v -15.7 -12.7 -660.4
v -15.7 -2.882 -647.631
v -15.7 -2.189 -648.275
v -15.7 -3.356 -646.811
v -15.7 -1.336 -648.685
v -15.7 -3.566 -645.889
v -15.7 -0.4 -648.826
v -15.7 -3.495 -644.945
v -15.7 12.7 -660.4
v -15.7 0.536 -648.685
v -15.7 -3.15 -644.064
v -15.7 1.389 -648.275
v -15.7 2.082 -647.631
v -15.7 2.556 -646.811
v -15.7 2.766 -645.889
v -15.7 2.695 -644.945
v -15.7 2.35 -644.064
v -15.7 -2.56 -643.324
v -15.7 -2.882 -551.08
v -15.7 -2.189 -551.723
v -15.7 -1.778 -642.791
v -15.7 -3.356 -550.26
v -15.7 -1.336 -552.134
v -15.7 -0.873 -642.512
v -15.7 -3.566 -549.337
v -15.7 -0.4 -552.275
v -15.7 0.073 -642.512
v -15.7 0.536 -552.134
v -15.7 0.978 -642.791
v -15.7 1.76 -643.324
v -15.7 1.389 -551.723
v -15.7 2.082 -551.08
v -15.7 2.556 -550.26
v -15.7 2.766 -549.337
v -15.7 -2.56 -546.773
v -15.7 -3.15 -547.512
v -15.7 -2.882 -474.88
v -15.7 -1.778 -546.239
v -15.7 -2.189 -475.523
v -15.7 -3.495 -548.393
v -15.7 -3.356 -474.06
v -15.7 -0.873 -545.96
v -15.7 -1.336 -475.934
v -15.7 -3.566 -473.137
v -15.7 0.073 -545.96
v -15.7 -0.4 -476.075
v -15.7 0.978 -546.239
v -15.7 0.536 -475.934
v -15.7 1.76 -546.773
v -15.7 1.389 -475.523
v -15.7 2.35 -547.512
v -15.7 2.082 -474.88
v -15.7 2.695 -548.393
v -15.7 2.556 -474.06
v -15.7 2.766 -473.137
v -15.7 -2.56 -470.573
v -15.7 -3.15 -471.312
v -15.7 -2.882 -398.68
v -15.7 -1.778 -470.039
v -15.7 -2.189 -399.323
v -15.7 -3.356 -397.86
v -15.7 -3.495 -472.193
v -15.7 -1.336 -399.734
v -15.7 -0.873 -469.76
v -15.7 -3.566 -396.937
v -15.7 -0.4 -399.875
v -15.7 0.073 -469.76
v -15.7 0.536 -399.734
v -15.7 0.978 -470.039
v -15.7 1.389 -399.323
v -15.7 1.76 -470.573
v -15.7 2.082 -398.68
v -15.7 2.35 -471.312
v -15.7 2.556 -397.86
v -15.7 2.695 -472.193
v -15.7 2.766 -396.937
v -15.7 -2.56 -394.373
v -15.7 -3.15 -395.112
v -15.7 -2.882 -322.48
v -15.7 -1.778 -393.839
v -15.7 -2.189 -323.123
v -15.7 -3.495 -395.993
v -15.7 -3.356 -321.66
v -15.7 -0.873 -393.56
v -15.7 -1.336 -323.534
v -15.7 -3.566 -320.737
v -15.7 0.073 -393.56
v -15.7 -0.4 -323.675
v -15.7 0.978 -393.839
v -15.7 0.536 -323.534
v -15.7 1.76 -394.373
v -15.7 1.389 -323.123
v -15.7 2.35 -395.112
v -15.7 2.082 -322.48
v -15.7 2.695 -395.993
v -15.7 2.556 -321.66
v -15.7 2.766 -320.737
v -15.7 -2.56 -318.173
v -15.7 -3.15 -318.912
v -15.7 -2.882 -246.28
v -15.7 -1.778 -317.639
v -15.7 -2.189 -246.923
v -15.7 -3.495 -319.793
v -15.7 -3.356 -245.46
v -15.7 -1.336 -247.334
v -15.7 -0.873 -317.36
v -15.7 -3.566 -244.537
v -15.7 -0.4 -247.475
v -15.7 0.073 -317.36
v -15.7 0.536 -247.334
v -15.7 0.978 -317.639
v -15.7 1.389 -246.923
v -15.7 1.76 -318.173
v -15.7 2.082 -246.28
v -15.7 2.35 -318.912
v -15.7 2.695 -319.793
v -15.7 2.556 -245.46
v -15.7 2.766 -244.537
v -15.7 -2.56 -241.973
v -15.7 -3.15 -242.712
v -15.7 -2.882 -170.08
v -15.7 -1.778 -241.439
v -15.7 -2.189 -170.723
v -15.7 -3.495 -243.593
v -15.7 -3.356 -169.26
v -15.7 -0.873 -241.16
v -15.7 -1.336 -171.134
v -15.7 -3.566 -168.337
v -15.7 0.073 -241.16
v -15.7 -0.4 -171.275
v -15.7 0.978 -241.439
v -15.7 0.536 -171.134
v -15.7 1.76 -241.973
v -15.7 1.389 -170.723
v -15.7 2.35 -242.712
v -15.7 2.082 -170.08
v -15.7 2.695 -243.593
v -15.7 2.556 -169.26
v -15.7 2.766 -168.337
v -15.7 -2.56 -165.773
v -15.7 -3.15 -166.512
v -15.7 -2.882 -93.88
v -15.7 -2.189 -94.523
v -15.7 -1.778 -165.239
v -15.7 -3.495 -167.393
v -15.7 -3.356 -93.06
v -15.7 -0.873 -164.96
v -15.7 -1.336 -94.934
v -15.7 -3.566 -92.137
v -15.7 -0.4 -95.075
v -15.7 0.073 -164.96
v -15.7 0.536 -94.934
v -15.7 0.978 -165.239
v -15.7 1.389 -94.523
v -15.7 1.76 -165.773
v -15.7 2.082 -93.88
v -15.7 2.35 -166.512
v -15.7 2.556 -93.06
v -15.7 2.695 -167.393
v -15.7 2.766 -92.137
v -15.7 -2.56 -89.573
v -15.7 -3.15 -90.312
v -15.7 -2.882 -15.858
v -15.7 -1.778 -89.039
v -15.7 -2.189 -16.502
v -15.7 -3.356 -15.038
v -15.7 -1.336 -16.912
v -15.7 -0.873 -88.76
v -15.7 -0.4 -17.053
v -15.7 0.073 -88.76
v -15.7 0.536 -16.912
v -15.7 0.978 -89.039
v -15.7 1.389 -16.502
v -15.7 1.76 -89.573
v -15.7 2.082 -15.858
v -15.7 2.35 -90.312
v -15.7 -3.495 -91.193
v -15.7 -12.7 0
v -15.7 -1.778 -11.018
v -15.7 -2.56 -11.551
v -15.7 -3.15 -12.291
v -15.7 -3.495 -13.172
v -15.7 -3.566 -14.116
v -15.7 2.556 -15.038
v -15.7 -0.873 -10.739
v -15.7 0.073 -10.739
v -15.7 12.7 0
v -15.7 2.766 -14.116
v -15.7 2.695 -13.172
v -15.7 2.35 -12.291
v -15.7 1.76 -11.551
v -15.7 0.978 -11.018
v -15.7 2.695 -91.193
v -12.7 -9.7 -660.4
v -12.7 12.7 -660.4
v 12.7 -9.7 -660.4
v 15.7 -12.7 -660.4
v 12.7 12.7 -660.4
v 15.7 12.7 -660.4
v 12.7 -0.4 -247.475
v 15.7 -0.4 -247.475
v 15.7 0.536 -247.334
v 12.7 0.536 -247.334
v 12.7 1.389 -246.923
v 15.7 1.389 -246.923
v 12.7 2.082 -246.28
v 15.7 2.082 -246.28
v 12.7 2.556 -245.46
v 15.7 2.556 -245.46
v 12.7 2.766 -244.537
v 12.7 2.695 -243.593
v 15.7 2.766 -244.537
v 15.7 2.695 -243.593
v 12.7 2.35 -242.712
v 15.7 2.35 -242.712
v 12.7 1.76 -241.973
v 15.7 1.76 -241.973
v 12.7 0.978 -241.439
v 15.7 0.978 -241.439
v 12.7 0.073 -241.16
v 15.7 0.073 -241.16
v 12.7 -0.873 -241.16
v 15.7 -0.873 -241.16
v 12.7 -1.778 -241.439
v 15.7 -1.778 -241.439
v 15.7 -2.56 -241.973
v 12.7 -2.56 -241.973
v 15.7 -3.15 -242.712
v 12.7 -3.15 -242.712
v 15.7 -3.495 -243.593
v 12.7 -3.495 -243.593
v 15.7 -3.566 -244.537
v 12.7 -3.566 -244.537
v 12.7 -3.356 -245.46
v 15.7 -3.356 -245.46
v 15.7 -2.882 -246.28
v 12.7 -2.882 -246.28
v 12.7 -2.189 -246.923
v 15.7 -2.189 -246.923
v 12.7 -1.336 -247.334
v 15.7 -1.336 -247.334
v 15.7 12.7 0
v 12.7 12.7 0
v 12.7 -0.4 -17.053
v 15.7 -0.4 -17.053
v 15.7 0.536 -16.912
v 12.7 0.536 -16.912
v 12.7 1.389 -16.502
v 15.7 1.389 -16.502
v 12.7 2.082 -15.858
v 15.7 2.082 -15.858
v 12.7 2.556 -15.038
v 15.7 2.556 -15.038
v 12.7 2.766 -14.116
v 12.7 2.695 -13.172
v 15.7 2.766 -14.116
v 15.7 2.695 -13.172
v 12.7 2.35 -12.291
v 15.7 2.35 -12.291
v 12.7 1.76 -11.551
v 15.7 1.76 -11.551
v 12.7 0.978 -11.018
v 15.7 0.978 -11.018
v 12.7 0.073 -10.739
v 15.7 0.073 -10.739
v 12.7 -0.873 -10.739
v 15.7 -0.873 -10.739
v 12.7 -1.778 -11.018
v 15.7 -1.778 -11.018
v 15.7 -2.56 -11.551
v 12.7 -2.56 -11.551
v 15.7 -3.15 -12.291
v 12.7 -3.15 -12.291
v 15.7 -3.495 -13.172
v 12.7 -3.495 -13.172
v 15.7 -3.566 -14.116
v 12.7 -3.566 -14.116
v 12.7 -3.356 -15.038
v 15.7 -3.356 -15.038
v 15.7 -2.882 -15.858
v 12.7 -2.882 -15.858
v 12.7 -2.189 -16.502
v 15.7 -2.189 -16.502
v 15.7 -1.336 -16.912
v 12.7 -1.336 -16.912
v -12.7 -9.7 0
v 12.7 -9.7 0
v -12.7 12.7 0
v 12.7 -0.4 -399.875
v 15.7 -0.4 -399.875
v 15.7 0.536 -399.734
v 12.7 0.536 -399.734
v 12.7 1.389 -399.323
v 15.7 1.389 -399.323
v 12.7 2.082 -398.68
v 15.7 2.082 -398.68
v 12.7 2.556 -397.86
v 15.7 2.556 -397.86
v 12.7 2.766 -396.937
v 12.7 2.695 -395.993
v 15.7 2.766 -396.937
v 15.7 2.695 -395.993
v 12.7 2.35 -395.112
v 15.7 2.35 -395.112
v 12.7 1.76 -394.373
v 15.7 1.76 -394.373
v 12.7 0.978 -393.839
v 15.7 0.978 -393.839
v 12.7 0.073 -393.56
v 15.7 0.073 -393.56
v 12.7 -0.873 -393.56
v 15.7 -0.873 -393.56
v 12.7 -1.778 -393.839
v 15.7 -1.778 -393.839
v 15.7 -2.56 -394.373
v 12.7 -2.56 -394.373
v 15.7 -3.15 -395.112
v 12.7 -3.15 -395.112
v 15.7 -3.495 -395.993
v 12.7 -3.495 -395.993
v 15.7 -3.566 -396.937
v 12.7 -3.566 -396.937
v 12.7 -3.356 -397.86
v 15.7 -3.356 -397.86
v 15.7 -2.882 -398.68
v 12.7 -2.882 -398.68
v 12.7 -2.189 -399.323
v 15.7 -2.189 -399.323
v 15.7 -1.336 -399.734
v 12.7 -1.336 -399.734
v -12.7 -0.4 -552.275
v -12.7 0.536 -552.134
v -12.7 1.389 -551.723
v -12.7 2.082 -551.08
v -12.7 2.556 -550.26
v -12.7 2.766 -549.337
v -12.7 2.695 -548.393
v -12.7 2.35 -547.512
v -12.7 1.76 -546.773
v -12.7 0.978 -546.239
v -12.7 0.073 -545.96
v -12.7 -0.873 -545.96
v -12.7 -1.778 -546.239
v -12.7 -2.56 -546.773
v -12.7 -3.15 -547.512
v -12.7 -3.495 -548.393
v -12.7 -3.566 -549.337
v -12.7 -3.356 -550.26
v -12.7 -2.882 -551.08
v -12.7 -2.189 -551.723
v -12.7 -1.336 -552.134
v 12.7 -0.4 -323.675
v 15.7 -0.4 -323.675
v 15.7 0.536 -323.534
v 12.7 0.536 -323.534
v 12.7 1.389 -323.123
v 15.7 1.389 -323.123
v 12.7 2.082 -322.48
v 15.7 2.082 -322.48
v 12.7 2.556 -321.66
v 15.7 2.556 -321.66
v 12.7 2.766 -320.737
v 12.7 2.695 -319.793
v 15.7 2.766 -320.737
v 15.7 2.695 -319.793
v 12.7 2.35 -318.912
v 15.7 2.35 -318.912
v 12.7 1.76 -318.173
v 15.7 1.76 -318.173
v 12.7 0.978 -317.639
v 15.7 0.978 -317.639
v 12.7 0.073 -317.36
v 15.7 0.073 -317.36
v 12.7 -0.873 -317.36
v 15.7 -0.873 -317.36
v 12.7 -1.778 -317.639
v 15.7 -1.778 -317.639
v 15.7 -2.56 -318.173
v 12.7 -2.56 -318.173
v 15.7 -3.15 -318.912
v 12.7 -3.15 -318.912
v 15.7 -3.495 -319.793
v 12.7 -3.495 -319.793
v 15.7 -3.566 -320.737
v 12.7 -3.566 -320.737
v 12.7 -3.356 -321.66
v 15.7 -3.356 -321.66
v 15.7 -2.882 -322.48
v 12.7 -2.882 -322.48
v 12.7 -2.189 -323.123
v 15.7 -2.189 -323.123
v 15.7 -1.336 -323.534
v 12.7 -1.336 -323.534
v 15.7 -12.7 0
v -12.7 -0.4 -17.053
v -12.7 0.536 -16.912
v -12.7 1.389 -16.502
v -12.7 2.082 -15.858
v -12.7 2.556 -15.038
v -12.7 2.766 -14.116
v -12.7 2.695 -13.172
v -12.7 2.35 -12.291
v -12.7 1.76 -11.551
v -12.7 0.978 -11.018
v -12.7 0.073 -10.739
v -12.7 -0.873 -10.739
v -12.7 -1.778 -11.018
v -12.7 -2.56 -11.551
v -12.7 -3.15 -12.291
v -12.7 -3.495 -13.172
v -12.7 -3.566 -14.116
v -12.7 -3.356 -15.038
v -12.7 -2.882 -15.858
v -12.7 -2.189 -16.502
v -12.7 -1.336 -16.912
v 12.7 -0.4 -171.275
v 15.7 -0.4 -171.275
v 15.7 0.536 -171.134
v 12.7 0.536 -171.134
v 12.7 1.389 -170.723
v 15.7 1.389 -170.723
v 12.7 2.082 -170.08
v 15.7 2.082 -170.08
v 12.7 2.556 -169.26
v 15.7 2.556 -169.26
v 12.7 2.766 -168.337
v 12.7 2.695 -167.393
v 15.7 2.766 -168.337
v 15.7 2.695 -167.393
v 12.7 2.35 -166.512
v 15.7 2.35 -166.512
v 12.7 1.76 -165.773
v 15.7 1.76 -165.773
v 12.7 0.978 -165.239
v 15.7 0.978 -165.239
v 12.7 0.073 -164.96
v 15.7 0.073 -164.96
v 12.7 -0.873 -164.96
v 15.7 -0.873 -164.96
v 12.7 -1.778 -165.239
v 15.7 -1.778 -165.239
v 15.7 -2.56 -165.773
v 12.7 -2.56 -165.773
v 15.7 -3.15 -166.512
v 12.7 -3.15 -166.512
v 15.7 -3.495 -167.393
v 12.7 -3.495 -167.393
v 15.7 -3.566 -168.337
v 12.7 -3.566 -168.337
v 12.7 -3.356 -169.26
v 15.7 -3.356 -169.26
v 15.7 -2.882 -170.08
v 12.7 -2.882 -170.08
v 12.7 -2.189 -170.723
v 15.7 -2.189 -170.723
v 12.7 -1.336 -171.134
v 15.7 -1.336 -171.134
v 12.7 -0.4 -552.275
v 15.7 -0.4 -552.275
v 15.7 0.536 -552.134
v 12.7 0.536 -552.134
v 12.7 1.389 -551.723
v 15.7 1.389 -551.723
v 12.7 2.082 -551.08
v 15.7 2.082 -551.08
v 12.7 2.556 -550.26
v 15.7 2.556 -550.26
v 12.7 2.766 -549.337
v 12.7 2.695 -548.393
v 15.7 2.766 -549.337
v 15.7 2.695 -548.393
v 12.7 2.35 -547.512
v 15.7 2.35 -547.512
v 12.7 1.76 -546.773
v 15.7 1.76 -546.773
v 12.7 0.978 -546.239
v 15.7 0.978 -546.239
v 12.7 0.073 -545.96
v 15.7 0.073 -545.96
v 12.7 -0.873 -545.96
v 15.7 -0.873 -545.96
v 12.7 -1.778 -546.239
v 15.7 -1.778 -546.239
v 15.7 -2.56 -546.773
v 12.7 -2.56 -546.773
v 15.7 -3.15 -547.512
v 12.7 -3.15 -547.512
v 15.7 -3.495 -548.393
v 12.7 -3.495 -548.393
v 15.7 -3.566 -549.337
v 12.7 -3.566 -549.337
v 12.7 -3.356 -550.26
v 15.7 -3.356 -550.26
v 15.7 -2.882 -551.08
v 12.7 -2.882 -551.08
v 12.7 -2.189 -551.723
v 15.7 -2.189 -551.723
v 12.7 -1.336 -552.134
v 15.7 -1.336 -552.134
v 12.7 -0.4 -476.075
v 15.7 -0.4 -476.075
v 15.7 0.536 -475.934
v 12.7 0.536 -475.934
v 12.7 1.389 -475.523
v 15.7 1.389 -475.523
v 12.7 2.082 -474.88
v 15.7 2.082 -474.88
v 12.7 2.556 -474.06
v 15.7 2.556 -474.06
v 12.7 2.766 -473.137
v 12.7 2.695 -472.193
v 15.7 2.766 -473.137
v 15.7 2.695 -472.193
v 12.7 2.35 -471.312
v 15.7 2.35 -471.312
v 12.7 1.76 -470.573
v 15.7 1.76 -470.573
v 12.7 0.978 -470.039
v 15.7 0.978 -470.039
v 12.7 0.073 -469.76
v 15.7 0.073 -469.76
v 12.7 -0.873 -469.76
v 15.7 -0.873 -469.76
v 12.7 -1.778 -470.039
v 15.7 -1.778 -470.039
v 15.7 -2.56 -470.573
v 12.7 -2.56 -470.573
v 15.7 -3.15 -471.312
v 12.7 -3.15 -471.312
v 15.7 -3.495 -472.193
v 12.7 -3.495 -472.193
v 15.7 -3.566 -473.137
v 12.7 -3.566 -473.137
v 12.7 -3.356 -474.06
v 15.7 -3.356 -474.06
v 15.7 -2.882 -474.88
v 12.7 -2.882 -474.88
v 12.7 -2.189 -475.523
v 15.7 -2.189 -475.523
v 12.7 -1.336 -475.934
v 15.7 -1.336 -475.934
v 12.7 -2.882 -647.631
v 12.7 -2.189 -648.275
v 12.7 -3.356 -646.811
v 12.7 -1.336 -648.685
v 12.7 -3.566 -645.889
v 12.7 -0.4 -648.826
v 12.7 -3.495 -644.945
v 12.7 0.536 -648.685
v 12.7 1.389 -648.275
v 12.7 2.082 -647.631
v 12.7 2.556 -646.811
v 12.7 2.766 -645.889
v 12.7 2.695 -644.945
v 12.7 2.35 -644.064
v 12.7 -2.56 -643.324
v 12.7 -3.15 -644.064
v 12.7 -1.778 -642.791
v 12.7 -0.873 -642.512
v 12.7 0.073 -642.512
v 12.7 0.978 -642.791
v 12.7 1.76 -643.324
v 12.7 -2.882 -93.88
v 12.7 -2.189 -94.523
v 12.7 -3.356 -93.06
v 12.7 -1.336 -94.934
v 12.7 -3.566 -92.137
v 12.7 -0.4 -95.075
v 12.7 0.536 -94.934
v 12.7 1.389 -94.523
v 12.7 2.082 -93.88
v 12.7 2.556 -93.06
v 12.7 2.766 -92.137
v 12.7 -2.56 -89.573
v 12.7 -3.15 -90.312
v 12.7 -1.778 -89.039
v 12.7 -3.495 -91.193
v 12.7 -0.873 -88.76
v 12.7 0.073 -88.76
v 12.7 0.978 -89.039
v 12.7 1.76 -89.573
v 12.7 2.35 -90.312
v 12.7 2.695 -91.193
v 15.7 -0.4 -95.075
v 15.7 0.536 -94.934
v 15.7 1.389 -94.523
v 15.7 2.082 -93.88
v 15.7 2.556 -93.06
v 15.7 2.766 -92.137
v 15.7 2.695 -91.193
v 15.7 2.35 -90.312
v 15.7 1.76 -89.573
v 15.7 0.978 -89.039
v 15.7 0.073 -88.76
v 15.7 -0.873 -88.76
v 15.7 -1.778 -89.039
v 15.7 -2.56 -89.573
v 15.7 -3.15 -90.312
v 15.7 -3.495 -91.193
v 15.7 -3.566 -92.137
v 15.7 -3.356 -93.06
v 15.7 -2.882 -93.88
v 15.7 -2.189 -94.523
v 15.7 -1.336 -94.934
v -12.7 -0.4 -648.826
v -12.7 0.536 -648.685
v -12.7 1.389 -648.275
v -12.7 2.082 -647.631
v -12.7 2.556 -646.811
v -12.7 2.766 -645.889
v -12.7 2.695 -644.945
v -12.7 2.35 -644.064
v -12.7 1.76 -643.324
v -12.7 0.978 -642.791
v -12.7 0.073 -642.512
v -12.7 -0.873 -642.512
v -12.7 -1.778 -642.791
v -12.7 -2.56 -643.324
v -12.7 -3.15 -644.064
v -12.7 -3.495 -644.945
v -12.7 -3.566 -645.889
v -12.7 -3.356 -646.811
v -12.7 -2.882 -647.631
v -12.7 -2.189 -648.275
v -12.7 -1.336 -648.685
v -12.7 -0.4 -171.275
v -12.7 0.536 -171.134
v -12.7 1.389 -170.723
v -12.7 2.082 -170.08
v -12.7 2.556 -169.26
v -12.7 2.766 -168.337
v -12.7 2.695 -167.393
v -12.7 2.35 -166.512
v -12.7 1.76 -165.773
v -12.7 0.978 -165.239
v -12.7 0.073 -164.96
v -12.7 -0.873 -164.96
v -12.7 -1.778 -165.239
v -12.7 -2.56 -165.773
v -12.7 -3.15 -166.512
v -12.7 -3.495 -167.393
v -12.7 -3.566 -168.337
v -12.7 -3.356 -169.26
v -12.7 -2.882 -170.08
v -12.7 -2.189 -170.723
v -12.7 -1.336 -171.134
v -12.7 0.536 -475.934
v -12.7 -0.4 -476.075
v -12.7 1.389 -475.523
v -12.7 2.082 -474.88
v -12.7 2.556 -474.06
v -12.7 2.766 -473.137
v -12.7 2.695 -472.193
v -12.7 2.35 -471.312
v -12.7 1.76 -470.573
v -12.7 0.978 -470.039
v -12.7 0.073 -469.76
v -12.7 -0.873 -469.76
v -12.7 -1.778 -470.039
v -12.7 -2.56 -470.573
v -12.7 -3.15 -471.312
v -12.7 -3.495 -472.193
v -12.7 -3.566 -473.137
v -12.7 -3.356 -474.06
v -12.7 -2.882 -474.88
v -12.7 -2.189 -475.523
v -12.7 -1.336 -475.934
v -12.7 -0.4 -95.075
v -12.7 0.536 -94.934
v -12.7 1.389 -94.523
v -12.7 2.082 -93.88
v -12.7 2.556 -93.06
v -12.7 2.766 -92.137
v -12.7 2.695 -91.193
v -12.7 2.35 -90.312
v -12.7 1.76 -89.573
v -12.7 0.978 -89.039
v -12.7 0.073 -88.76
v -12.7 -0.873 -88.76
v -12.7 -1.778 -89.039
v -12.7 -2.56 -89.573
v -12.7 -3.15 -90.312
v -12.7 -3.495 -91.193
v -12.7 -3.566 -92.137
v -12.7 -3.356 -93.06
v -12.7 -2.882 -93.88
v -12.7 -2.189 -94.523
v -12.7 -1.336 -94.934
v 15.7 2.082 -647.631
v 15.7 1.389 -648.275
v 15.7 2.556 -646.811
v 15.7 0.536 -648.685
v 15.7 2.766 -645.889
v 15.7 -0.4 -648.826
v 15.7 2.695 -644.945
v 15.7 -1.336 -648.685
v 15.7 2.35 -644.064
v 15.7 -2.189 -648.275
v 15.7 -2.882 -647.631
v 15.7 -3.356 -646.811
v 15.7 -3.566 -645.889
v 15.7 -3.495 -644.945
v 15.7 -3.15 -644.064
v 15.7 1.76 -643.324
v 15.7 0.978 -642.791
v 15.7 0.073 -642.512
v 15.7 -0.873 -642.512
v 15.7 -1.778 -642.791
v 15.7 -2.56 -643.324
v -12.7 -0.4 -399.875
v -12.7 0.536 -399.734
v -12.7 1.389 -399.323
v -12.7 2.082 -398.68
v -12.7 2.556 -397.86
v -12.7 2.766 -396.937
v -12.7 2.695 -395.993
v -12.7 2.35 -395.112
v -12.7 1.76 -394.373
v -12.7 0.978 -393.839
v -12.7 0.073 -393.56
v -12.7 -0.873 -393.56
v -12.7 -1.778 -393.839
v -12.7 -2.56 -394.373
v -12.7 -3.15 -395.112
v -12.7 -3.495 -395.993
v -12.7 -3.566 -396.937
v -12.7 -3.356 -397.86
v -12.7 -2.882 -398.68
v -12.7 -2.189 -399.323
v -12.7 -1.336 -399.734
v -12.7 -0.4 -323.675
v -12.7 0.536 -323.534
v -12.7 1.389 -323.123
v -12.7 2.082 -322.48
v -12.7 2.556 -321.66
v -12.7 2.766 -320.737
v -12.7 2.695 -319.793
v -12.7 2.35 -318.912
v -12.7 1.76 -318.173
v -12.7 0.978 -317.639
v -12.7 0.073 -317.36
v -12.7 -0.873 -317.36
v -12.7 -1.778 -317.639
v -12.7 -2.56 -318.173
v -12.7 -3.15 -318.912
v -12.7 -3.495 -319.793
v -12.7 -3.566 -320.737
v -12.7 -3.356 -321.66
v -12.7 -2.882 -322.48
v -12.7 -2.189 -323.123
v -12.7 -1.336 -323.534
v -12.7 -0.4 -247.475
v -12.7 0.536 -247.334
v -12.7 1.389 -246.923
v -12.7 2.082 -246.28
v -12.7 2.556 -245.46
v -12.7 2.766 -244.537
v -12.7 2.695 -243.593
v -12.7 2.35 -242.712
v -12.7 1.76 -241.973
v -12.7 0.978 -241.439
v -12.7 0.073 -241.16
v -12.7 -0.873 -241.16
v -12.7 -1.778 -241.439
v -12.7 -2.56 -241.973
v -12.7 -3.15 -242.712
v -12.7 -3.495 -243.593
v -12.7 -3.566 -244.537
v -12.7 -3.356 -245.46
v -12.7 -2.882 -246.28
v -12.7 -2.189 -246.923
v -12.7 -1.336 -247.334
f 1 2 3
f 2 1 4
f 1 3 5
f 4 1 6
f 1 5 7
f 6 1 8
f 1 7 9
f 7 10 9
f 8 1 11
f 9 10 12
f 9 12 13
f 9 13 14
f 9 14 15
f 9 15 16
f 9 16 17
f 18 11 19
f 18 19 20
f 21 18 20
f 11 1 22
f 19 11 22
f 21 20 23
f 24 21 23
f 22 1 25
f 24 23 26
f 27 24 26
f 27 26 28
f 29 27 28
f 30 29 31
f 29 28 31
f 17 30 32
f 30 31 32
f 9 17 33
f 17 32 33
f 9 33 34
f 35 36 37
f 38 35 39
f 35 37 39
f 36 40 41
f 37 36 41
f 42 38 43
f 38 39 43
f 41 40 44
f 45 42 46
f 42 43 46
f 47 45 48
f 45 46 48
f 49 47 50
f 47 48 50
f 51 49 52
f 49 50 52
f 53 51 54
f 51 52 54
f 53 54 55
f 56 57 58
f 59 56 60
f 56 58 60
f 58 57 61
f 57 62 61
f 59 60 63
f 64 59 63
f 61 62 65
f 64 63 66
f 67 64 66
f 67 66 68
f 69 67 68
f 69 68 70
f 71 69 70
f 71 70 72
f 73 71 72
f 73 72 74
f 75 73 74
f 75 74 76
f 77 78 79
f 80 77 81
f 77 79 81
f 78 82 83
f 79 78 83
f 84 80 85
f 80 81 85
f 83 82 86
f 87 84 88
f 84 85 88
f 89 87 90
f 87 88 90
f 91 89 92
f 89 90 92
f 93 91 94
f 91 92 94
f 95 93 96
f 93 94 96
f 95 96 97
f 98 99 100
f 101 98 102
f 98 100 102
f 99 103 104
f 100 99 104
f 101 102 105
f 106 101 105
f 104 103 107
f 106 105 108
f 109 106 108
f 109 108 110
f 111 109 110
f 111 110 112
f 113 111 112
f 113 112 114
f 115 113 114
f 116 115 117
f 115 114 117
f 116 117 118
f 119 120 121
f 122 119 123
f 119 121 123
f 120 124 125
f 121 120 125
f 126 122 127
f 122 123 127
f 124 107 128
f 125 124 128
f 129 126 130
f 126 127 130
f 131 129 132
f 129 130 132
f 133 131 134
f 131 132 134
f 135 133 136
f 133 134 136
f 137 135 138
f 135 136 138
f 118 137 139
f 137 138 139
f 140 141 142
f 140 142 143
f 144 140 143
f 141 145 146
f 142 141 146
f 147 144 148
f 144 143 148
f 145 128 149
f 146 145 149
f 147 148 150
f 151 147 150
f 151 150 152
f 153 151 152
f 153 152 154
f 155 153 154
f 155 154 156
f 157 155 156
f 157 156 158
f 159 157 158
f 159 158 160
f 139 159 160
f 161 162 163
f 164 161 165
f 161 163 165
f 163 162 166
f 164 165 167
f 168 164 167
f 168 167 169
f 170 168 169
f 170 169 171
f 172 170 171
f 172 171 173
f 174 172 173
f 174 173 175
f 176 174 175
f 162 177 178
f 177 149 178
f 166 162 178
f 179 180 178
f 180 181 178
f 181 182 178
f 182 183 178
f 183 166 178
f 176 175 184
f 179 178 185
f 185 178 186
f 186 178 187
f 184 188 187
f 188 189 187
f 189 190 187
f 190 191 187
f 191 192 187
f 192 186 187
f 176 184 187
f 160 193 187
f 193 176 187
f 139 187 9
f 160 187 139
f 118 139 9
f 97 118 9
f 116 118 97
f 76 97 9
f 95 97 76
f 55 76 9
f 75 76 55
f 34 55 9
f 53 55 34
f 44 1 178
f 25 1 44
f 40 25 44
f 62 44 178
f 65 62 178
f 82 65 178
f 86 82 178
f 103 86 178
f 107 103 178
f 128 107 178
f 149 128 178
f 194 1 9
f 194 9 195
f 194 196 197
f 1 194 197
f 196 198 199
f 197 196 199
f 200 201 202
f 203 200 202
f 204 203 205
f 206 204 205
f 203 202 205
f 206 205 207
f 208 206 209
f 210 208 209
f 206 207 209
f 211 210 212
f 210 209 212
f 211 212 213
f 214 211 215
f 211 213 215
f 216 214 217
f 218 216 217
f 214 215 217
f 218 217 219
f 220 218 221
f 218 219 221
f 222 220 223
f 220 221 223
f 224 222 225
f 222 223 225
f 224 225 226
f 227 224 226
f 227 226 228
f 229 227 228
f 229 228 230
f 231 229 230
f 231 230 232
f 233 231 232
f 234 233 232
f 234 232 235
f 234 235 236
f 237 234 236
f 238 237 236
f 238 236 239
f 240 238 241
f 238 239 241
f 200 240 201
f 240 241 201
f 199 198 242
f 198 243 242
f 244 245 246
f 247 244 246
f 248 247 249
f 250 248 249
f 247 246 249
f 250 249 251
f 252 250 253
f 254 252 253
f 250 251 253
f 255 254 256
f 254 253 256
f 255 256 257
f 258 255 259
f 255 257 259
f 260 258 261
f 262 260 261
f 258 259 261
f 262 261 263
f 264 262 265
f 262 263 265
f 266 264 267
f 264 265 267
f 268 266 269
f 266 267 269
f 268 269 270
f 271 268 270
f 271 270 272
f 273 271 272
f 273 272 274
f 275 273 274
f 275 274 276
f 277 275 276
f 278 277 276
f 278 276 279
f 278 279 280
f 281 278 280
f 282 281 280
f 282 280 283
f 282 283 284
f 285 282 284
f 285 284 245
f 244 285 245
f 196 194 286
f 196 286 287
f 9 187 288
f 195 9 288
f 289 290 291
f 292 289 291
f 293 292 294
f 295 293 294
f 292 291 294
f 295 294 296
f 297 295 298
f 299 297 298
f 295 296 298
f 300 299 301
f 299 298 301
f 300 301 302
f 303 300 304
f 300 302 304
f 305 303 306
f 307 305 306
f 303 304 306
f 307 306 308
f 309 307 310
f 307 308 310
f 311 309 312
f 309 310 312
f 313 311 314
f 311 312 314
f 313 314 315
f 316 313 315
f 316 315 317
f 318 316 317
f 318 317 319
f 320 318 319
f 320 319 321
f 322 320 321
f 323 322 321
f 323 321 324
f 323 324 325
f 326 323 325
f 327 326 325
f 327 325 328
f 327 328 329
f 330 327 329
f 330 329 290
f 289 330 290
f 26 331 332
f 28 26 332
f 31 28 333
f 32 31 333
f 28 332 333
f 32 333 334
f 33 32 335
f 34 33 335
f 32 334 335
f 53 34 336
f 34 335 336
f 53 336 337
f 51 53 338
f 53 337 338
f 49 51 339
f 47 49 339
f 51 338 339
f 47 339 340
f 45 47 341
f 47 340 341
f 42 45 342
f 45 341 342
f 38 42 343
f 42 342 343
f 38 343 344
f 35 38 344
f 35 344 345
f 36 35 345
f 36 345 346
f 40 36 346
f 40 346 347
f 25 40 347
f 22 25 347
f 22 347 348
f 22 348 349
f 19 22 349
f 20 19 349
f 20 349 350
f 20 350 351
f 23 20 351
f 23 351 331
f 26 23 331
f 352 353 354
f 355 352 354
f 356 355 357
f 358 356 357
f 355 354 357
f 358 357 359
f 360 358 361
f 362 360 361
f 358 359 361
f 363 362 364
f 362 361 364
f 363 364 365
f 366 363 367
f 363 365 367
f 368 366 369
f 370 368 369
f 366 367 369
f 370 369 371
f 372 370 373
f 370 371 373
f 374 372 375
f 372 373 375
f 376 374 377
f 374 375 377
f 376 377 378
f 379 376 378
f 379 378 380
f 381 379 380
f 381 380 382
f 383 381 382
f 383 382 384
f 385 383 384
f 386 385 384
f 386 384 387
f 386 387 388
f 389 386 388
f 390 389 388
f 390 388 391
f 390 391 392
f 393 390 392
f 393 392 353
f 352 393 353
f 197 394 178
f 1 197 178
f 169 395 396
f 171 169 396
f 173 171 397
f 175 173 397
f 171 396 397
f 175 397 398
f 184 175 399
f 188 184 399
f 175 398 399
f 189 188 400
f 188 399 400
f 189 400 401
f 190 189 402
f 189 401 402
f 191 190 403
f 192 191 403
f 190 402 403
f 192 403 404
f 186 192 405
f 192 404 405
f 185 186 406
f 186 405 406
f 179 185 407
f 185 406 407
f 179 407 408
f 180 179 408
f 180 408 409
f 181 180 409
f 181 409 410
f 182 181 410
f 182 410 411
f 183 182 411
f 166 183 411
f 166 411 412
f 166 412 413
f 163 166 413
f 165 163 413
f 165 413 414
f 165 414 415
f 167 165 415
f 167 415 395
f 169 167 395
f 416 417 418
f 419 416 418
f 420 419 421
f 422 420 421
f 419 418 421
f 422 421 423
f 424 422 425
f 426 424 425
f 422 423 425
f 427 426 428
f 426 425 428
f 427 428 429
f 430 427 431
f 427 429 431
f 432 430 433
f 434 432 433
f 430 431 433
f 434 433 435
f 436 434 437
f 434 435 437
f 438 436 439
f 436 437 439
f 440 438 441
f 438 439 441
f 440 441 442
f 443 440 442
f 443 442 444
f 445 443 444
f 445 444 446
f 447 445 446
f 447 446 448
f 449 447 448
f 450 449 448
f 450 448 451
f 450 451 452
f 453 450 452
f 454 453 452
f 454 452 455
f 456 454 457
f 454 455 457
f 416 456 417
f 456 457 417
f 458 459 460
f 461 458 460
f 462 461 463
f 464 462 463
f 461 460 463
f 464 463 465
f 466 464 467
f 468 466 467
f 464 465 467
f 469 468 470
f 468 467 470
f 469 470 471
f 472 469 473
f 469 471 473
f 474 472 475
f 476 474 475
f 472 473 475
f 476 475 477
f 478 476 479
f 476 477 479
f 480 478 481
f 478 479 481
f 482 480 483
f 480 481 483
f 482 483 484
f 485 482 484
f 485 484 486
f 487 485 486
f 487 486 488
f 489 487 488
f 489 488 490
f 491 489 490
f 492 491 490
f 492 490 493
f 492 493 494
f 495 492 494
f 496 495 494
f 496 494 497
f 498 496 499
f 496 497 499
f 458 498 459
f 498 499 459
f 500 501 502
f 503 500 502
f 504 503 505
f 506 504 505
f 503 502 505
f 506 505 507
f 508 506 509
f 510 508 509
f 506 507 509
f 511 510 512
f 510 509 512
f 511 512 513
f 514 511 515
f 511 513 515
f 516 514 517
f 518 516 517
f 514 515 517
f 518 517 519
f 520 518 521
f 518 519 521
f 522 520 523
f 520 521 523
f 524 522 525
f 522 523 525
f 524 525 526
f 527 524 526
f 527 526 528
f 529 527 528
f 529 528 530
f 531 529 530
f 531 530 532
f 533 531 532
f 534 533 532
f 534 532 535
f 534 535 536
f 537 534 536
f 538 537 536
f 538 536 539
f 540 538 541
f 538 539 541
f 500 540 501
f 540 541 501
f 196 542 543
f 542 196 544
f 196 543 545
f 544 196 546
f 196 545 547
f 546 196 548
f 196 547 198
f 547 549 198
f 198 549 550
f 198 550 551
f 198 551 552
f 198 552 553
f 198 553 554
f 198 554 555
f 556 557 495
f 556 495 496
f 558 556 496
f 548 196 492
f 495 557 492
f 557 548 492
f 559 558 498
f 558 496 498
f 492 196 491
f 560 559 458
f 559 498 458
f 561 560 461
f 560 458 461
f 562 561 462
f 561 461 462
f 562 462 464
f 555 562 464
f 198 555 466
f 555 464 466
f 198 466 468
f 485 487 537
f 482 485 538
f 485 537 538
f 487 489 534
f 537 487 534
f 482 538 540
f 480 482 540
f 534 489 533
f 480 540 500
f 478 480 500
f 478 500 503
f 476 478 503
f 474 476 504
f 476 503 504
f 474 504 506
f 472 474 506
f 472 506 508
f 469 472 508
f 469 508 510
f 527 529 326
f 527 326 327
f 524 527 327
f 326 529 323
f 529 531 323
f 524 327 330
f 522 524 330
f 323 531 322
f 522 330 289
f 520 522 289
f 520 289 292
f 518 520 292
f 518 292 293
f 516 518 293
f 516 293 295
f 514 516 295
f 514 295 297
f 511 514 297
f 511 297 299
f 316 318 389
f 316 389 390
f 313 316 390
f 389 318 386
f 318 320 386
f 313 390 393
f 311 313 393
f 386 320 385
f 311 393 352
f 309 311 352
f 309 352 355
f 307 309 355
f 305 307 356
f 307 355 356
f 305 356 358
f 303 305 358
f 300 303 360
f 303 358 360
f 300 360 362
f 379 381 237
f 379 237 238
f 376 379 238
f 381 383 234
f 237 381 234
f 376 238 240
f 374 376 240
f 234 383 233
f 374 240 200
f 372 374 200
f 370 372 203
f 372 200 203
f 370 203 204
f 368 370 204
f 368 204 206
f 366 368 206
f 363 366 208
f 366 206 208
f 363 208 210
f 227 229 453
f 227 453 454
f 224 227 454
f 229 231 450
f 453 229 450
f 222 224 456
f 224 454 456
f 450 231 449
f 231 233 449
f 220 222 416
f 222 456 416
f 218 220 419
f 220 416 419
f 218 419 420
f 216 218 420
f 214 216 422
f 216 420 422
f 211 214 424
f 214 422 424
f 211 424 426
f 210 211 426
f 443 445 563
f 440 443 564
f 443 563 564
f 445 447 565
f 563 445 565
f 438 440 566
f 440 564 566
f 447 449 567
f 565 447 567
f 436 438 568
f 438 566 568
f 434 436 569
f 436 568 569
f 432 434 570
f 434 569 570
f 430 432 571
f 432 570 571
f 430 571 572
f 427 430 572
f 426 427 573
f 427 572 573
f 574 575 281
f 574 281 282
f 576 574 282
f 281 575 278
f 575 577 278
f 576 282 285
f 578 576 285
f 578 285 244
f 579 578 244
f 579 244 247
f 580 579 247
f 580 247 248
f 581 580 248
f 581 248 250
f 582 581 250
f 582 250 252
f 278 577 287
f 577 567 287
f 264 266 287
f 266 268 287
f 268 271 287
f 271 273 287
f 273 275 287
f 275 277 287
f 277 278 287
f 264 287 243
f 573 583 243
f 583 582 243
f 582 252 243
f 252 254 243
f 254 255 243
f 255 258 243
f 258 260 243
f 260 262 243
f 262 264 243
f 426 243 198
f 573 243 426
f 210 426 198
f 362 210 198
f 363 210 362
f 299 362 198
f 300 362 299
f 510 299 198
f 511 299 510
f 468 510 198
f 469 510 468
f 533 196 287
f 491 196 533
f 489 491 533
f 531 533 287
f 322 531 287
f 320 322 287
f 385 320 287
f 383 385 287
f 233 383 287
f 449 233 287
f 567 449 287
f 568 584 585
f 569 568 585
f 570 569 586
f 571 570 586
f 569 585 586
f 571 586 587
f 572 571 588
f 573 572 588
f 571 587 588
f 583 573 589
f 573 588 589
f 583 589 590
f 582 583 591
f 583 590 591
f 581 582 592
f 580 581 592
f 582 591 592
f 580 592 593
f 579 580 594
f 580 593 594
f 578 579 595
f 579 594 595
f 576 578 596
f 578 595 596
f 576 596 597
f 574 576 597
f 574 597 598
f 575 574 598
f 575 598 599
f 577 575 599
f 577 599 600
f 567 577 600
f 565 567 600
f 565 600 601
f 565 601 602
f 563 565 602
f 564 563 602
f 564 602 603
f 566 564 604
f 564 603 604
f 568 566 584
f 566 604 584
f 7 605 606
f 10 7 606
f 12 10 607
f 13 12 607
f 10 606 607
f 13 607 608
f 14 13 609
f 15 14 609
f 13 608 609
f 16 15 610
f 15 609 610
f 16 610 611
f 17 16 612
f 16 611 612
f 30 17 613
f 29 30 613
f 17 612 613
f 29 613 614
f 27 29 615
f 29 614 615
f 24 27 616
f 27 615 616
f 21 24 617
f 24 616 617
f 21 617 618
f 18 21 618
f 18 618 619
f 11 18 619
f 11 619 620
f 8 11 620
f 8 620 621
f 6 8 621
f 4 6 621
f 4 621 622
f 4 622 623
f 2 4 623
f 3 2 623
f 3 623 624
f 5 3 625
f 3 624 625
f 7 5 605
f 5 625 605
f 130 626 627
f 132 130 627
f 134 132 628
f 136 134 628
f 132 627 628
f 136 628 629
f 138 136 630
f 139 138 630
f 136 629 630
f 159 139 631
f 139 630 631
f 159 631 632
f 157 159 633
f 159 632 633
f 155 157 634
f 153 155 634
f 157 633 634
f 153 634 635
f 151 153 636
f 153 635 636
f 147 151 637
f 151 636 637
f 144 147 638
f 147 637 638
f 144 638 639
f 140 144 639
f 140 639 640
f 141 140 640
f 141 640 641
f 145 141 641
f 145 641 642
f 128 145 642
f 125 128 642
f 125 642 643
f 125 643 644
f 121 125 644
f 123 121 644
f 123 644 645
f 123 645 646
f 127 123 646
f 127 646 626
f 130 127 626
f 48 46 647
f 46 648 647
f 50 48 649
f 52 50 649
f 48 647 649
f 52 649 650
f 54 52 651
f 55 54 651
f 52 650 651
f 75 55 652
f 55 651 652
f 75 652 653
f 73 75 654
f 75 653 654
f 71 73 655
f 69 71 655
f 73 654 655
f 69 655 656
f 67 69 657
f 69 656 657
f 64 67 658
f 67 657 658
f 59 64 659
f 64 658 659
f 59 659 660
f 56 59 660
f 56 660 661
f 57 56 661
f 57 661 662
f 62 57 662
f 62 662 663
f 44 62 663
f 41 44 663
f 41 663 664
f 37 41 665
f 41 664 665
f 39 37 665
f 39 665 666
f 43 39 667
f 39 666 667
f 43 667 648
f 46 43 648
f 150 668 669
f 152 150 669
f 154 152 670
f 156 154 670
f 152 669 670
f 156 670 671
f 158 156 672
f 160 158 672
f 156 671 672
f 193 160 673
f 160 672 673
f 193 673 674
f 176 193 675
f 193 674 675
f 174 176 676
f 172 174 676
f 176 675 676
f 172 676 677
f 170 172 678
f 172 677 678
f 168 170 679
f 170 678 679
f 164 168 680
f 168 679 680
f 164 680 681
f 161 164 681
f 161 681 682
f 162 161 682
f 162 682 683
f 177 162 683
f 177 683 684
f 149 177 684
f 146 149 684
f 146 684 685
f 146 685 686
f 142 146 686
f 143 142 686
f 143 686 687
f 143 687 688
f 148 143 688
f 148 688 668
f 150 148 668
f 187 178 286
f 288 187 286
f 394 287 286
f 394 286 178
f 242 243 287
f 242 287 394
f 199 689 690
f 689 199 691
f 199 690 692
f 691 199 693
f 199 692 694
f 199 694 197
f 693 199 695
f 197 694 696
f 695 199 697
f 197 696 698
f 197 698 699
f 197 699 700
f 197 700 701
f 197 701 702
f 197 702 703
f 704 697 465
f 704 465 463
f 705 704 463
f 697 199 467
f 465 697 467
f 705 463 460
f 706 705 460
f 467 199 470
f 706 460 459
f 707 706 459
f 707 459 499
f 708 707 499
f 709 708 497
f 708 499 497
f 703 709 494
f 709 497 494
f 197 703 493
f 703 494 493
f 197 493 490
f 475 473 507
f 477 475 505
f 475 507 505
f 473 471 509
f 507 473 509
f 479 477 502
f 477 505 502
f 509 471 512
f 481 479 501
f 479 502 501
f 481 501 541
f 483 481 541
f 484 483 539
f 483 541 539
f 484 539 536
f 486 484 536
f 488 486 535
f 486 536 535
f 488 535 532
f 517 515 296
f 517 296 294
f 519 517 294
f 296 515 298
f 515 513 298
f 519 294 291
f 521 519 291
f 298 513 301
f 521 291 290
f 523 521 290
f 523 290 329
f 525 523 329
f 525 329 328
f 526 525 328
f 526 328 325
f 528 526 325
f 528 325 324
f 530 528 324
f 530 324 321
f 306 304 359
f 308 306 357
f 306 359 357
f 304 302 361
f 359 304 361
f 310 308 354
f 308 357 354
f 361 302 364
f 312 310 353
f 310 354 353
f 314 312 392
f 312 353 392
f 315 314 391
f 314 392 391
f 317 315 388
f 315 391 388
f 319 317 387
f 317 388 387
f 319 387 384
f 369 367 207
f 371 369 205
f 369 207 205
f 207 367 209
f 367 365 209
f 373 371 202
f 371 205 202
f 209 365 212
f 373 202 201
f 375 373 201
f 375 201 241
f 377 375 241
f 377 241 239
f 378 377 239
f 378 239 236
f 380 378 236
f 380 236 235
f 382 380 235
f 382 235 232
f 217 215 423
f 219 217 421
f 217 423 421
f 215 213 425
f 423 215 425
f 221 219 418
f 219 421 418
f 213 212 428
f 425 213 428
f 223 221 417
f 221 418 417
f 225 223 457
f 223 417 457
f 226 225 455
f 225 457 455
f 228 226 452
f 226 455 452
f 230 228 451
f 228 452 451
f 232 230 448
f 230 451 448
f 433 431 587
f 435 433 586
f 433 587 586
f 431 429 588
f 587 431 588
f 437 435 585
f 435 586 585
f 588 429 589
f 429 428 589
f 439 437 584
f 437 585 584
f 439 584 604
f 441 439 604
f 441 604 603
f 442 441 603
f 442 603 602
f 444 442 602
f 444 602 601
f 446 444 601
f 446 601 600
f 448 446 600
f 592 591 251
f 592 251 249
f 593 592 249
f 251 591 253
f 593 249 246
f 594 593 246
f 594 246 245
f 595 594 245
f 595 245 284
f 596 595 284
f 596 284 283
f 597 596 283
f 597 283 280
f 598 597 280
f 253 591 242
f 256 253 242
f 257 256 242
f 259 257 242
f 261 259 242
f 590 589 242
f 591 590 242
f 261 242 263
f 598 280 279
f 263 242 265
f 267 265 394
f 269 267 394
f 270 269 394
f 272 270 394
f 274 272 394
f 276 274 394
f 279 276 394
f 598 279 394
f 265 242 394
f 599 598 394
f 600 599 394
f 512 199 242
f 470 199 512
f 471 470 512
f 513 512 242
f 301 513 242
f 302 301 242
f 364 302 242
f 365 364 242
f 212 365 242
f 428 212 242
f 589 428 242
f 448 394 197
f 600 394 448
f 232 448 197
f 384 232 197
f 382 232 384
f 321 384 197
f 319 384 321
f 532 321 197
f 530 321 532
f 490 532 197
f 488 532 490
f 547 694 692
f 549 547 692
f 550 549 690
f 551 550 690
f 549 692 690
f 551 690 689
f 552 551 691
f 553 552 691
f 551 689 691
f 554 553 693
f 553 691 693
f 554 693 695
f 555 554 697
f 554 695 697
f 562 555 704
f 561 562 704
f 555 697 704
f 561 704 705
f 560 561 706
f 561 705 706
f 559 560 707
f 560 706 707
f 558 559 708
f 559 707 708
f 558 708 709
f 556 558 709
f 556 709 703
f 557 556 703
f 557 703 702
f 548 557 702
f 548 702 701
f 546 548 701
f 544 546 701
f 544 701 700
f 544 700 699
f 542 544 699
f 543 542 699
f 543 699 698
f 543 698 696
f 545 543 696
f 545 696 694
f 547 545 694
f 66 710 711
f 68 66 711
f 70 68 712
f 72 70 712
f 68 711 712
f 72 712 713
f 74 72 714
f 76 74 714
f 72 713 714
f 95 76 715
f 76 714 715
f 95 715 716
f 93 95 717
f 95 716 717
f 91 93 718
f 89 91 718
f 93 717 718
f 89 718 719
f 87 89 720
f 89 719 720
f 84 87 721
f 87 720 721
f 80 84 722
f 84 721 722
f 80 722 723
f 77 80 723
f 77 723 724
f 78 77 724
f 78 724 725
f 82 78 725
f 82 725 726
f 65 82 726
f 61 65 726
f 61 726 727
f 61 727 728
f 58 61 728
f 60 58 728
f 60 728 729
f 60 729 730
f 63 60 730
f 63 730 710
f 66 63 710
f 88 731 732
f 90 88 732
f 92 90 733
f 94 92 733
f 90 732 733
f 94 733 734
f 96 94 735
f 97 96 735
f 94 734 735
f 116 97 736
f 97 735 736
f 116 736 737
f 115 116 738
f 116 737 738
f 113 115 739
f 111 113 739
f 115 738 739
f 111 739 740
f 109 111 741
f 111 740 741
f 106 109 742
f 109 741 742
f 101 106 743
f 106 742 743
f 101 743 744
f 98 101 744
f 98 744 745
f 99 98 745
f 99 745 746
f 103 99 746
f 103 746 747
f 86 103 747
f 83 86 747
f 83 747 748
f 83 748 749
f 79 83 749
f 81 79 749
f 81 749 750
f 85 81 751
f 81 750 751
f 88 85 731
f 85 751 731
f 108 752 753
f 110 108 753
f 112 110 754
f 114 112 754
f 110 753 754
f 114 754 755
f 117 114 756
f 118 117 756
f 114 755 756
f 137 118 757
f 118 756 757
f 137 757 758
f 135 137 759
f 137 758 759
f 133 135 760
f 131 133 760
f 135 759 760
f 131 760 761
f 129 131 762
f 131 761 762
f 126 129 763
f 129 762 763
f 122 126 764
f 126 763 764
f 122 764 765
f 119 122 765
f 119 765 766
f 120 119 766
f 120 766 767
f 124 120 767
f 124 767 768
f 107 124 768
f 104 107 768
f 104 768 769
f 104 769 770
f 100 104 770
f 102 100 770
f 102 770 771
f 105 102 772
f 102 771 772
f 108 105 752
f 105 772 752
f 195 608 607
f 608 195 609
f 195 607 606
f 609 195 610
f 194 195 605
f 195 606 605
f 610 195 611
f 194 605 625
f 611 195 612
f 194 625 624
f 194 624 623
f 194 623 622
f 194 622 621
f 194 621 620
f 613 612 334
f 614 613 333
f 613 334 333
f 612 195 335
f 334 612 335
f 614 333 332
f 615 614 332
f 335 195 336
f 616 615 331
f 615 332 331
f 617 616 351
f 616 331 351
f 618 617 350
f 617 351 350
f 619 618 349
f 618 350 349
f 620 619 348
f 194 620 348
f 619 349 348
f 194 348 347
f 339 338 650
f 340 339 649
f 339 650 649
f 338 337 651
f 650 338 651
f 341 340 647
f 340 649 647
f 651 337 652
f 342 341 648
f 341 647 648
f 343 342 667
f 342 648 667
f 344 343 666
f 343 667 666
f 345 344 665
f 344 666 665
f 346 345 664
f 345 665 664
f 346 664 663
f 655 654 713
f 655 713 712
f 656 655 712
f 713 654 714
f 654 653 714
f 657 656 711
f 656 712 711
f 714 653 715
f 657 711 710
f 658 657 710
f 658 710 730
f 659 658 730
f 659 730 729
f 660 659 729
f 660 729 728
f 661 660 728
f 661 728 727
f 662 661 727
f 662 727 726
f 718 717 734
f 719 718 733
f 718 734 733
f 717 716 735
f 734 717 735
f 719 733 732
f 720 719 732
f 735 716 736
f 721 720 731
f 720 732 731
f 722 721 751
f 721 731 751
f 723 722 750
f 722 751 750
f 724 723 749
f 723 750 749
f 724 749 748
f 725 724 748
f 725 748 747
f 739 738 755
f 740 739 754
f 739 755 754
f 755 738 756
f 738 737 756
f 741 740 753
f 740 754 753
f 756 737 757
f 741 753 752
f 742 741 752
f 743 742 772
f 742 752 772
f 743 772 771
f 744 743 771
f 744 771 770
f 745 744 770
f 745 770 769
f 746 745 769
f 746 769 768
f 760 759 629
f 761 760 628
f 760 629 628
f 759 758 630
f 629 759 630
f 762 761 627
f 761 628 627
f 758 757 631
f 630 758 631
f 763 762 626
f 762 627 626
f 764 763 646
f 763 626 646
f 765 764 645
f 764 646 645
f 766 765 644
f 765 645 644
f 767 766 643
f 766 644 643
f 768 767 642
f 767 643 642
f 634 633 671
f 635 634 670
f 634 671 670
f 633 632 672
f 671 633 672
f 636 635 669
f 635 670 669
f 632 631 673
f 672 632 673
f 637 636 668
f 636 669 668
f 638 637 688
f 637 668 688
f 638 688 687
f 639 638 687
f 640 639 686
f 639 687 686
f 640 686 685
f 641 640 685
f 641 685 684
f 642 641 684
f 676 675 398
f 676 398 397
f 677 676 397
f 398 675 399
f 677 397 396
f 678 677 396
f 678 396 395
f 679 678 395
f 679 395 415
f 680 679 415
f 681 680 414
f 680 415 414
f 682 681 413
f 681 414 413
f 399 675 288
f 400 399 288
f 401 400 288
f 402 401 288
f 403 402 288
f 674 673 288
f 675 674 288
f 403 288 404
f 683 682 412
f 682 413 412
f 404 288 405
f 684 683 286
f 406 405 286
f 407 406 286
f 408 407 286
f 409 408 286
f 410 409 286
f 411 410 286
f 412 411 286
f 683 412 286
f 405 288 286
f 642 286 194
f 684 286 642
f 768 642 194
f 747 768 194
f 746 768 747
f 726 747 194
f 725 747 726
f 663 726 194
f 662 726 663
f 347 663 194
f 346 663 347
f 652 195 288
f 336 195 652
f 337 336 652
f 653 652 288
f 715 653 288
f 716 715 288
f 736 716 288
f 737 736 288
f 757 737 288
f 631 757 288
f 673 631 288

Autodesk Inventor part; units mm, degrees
ref_plane "YZ Plane" through (0, 0, 0) normal (1, 0, 0) x (0, 1, 0)
ref_plane "XZ Plane" through (0, 0, 0) normal (0, 1, 0) x (-1, 0, 0)
ref_plane "XY Plane" through (0, 0, 0) normal (0, 0, 1) x (1, 0, 0)
sketch "Sketch1" plane through (0, 0, 0) normal (0, 0, 1) x (1, 0, 0)
  line L0 (-15.7, 12.7) -> (-12.7, 12.7)
  line L1 (-12.7, 12.7) -> (-12.7, -9.7)
  line L2 (-12.7, -9.7) -> (12.7, -9.7)
  line L3 (12.7, -9.7) -> (12.7, 12.7)
  line L4 (12.7, 12.7) -> (15.7, 12.7)
  line L5 (15.7, 12.7) -> (15.7, -12.7)
  line L6 (15.7, -12.7) -> (-15.7, -12.7)
  line L7 (-15.7, -12.7) -> (-15.7, 12.7)
  point P0 (0, 0)
  dimension "d0" = 3
  dimension "d2" = 3
  dimension "d3" = 25.4
  dimension "d4" = 31.4
  dimension "d5" = 15.7
  dimension "d7" = 12.7
  dimension "d8" = 3
extrude "Extrusion1" add sketch "Sketch1" against normal blind 660.4
sketch "Sketch5" plane through (15.7, -12.7, 0) normal (1, 0, 0) x (0, 0, -1)
  circle A0 centre (13.8784, 12.3) radius 3.175
  circle A1 centre (91.9, 12.3) radius 3.175
  circle A2 centre (168.1, 12.3) radius 3.175
  circle A3 centre (244.3, 12.3) radius 3.175
  circle A4 centre (320.5, 12.3) radius 3.175
  circle A5 centre (396.7, 12.3) radius 3.175
  circle A6 centre (472.9, 12.3) radius 3.175
  circle A7 centre (549.1, 12.3) radius 3.175
  circle A8 centre (645.6513, 12.3) radius 3.175
  point P0 (0, 12.7)
  dimension "d56" = 6.35
  dimension "d58" = 6.35
  dimension "d59" = 6.35
  dimension "d60" = 6.35
  dimension "d61" = 6.35
  dimension "d62" = 6.35
  dimension "d63" = 6.35
  dimension "d64" = 6.35
  dimension "d65" = 6.35
extrude "Extrusion5" cut sketch "Sketch5" against normal blind 76.2
equation "\"d2\" = d0"
equation "\"d5\" = 0.5 * d4"
equation "\"d7\" = 0.5 * d3"
equation "\"d8\" = d0"
equation "\"d58\" = d56"
equation "\"d59\" = d58"
equation "\"d60\" = d59"
equation "\"d61\" = d60"
equation "\"d62\" = d61"
equation "\"d63\" = d62"
equation "\"d64\" = d63"
equation "\"d65\" = d64"
properties part number "26in C-Channel Left" material "Aluminum 6061"
